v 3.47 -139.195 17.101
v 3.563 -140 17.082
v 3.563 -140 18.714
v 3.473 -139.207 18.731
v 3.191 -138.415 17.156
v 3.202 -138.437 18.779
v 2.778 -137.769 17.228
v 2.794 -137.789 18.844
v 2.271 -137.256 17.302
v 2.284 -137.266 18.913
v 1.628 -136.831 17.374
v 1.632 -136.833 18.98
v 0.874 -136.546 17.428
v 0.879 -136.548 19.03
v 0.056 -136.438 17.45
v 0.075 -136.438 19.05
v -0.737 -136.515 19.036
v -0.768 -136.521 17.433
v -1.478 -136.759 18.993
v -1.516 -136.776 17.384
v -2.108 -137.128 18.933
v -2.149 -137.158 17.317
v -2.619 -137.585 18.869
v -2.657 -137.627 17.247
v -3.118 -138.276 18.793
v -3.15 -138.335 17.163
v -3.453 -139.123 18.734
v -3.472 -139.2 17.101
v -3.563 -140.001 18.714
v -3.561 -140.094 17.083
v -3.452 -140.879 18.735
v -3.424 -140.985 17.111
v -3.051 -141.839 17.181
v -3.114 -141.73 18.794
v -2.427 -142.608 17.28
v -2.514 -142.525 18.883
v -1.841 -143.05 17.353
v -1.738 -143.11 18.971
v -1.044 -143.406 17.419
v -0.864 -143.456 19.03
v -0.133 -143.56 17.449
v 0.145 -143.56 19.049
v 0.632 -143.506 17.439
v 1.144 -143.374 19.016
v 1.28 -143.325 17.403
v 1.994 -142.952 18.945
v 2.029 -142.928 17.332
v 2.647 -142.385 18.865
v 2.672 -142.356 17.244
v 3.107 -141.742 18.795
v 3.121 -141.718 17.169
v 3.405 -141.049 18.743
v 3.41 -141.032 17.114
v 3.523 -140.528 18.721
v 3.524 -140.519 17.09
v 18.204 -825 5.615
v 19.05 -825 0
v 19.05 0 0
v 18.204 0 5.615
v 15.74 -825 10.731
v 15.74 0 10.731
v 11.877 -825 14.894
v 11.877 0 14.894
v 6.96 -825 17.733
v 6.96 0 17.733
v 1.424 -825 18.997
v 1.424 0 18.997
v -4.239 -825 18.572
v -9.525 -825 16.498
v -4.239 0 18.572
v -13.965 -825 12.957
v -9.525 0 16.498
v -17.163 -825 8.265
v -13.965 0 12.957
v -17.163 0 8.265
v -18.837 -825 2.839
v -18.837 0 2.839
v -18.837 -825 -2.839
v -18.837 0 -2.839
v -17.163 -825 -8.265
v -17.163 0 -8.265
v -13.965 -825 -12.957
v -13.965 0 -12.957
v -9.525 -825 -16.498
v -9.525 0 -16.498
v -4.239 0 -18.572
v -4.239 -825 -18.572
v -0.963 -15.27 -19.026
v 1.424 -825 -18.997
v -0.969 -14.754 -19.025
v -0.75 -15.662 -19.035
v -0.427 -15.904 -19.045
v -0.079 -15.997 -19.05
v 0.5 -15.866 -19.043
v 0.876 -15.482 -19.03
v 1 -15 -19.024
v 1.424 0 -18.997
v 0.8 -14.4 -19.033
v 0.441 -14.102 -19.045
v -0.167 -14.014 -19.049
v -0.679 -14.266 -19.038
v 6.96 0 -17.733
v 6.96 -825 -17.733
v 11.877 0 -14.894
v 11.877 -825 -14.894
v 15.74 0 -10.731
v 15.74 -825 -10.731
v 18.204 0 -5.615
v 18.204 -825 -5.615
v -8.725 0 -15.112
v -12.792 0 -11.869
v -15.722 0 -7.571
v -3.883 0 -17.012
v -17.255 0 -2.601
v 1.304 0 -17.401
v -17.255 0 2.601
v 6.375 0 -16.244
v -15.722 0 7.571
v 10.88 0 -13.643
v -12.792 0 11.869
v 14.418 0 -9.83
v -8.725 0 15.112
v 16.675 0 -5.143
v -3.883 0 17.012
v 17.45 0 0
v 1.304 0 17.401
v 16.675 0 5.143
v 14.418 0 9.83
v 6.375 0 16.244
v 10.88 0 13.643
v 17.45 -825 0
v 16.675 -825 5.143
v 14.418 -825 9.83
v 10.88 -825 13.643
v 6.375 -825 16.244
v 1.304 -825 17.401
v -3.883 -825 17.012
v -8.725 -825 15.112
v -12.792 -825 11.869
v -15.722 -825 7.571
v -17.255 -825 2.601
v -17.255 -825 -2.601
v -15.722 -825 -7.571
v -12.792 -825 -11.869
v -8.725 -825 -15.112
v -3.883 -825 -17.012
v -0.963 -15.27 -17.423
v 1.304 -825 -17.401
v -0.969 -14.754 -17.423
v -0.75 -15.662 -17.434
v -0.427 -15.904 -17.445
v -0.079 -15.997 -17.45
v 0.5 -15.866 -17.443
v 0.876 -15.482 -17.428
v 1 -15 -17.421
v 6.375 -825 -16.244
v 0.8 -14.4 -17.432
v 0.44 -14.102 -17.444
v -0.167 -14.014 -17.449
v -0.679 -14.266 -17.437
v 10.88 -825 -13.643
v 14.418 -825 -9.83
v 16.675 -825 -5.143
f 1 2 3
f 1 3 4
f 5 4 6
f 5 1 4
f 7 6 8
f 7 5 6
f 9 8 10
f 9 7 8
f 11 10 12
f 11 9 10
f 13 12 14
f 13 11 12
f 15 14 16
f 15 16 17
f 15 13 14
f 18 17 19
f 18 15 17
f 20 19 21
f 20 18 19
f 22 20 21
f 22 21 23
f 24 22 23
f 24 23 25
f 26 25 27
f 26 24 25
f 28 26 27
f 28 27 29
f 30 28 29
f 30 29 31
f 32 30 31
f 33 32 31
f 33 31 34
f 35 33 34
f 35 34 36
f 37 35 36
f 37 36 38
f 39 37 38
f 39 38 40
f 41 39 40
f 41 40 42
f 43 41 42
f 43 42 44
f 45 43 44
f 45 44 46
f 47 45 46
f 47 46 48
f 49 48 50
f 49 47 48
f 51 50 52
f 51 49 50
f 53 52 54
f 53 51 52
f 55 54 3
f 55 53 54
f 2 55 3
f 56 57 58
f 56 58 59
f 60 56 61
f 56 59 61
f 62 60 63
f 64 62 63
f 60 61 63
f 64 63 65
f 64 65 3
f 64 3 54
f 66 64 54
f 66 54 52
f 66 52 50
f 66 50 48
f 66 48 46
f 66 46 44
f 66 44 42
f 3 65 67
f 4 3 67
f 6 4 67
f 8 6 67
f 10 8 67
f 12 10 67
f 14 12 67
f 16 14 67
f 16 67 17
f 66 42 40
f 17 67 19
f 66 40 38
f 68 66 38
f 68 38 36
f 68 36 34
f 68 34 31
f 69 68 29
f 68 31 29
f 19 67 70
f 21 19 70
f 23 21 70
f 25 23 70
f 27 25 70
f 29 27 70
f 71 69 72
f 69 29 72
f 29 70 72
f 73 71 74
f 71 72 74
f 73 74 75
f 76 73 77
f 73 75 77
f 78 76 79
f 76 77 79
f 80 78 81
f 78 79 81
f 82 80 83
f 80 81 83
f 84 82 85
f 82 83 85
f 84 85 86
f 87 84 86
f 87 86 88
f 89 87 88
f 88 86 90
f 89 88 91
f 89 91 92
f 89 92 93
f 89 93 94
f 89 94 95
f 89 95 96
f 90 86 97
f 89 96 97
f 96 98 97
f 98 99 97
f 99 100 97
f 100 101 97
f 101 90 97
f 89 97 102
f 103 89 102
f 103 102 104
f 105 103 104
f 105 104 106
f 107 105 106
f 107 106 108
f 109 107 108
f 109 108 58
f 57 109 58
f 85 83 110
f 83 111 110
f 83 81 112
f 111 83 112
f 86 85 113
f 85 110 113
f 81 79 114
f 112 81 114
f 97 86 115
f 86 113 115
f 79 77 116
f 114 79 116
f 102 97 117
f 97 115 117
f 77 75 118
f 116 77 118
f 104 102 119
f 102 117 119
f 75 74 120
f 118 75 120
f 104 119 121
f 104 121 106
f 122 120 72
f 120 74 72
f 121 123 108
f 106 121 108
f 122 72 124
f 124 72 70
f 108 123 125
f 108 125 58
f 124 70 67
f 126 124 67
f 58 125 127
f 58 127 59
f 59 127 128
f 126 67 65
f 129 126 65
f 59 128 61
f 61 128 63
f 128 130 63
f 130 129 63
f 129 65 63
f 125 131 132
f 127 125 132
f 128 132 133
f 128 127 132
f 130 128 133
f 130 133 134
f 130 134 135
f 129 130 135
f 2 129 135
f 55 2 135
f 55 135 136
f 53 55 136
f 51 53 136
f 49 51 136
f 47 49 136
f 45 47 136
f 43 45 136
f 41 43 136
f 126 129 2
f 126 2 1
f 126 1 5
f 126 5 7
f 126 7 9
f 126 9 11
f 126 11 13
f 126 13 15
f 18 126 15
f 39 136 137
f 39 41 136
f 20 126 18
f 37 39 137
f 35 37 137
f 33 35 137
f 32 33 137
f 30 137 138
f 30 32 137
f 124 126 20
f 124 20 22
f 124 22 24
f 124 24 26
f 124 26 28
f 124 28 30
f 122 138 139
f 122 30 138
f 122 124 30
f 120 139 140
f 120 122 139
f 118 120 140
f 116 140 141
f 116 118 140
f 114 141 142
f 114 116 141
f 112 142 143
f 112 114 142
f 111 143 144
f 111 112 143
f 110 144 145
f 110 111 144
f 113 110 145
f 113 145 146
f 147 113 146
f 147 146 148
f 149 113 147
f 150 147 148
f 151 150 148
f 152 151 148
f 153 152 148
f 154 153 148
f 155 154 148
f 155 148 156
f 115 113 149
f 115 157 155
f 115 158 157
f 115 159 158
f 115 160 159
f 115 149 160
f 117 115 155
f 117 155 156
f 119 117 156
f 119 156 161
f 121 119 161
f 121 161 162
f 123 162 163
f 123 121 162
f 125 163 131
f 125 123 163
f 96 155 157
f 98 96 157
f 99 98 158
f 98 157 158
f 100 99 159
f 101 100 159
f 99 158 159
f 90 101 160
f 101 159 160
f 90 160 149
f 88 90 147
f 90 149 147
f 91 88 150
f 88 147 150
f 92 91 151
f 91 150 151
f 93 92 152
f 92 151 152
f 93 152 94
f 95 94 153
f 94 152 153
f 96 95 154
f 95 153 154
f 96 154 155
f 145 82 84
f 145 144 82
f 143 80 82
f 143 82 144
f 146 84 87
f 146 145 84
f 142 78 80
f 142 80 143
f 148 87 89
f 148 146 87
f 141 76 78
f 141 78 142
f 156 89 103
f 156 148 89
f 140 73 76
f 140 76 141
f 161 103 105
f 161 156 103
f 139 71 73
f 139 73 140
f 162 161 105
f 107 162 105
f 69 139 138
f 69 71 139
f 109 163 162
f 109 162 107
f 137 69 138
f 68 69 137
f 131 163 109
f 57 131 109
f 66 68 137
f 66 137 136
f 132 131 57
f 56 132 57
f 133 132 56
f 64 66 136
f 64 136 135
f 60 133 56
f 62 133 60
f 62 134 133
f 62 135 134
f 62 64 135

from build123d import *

# Parameters (mm, degrees)
F0_R     = 19.05
F0_R_2   = 17.45
F1_DEPTH = 825
F2_R     = 3.5625283299
F3_DEPTH = 20.050000094
F4_R     = 1
F5_DEPTH = 20.050000107


with BuildPart() as f1:
    # F0 (on Front) → F1 (new body)
    with BuildSketch(Plane.XZ):
        Circle(F0_R)
        Circle(F0_R_2, mode=Mode.SUBTRACT)
    extrude(amount=F1_DEPTH)

    # F2 (on Top) → F3 (cut, up to face)
    with BuildSketch(Plane.XY):
        with Locations((0, -140)):
            Circle(F2_R)
    extrude(amount=F3_DEPTH, mode=Mode.SUBTRACT)

    # F4 (on Top) → F5 (cut, up to face)
    with BuildSketch(Plane.XY):
        with Locations((0, -15)):
            Circle(F4_R)
    extrude(amount=-F5_DEPTH, mode=Mode.SUBTRACT)


solid = f1.part
